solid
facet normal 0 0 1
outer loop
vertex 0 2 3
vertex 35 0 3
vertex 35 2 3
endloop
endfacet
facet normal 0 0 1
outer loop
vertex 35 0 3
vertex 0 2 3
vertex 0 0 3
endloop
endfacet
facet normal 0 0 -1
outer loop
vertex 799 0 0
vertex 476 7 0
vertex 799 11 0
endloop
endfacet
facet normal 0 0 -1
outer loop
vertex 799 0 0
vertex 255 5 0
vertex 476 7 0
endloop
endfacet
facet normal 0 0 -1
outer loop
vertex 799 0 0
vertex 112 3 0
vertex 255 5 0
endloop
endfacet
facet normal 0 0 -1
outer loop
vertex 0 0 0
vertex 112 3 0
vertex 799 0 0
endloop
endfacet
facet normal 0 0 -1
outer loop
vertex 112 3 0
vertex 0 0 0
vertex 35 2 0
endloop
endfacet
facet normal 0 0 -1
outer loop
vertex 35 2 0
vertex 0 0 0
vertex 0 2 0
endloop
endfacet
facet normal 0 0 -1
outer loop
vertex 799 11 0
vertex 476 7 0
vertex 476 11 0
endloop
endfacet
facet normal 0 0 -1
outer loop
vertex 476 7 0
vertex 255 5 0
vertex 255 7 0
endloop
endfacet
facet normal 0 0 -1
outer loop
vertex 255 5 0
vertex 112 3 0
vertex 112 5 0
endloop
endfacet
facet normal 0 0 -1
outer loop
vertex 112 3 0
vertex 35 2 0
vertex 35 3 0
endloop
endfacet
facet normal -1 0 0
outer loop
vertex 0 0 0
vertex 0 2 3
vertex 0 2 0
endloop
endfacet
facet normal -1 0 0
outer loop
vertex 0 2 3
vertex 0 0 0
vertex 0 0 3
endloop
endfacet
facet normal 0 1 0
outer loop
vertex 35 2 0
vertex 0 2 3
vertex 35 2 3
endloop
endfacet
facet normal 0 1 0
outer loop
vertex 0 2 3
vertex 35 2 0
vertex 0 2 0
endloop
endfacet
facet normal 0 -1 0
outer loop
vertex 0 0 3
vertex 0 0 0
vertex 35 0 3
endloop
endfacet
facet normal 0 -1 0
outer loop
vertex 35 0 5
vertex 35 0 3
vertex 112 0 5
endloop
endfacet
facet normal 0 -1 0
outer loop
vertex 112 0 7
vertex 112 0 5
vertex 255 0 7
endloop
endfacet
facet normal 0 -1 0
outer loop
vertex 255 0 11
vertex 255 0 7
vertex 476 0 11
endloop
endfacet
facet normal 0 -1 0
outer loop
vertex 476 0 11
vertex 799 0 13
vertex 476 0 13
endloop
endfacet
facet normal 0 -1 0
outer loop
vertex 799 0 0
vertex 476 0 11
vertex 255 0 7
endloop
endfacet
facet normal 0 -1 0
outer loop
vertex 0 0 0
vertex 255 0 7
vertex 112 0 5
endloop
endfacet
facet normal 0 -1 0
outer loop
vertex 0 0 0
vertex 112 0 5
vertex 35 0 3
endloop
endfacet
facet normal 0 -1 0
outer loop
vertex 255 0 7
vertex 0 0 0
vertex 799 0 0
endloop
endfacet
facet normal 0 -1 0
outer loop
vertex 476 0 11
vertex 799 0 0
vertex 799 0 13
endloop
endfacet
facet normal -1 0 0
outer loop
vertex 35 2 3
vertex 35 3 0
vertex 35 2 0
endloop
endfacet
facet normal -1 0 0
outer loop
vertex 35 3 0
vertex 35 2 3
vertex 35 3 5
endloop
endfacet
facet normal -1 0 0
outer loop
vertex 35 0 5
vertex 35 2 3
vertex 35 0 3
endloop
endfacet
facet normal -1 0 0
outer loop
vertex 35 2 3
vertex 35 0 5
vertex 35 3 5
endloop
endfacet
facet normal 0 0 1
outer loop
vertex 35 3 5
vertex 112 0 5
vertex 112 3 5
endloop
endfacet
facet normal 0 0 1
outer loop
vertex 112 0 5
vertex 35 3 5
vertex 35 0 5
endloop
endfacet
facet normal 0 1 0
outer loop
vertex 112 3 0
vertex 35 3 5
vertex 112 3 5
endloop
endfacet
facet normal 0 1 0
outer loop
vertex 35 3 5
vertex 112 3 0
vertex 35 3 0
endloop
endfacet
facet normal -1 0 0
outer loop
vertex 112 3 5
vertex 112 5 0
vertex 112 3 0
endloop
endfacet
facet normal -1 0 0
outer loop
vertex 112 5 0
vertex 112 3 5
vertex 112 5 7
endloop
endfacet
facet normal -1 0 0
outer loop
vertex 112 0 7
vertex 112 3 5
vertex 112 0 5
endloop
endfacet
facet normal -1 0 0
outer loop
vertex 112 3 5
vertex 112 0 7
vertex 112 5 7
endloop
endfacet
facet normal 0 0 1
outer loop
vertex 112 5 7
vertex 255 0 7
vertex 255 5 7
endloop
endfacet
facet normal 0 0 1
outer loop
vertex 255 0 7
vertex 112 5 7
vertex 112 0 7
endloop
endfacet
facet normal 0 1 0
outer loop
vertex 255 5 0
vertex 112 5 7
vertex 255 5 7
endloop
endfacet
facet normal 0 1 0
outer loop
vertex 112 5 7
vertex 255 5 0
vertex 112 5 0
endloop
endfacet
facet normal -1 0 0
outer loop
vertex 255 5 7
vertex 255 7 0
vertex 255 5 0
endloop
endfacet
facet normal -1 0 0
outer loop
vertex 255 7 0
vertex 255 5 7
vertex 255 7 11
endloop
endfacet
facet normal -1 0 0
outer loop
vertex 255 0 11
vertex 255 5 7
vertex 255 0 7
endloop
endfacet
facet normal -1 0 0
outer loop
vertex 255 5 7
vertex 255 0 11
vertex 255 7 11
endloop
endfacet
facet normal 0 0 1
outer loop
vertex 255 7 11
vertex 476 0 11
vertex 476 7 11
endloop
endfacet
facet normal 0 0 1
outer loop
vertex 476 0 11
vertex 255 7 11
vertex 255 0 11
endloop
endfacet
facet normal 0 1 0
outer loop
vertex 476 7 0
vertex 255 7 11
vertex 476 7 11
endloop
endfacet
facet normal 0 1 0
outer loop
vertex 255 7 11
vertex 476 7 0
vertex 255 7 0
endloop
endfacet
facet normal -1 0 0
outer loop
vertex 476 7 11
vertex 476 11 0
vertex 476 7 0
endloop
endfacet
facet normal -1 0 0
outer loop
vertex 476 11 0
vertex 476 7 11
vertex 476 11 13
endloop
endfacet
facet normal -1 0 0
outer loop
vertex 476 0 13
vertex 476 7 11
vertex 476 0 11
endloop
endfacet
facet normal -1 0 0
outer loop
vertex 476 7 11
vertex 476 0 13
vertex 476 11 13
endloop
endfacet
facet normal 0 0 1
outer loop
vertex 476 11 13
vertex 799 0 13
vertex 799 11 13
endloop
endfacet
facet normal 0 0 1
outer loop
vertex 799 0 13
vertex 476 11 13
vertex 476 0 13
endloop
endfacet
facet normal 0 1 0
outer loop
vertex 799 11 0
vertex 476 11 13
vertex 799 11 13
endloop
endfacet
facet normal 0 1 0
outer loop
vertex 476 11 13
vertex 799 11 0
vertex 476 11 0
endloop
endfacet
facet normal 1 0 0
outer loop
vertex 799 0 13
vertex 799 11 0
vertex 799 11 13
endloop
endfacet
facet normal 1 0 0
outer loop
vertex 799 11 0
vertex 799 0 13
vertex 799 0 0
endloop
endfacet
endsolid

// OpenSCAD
translate([2.5, 1.0, 1.5]) color([0.10530639745894443, 0.9556548717215211, 0.5435731515542631]) cube([5, 2, 3], center=true);
translate([7.5, 1.0, 1.5]) color([0.7414270622920264, 0.9040457292510377, 0.2786145977098805]) cube([5, 2, 3], center=true);
translate([12.5, 1.0, 1.5]) color([0.4423646135017597, 0.5682329433322765, 0.13781274972163116]) cube([5, 2, 3], center=true);
translate([17.5, 1.0, 1.5]) color([0.1232982180791492, 0.12051785276403837, 0.4012165411640888]) cube([5, 2, 3], center=true);
translate([22.5, 1.0, 1.5]) color([0.4679428423906348, 0.5596131508667647, 0.29896126951320356]) cube([5, 2, 3], center=true);
translate([27.5, 1.0, 1.5]) color([0.6321114709426877, 0.7423454703026071, 0.21800995973285464]) cube([5, 2, 3], center=true);
translate([32.5, 1.0, 1.5]) color([0.48885816108208613, 0.501567157493831, 0.49271975198428686]) cube([5, 2, 3], center=true);
translate([38.5, 1.5, 2.5]) color([0.958422556968198, 0.44398175403613704, 0.14281143058247625]) cube([7, 3, 5], center=true);
translate([45.5, 1.5, 2.5]) color([0.4955231327742775, 0.8873352305676206, 0.21571394075115613]) cube([7, 3, 5], center=true);
translate([52.5, 1.5, 2.5]) color([0.3554013630116646, 0.39096604949642, 0.9928835035123682]) cube([7, 3, 5], center=true);
translate([59.5, 1.5, 2.5]) color([0.8462248334797323, 0.9789066021625461, 0.6868956228130294]) cube([7, 3, 5], center=true);
translate([66.5, 1.5, 2.5]) color([0.08137290691060206, 0.9493092651810784, 0.9246190463677613]) cube([7, 3, 5], center=true);
translate([73.5, 1.5, 2.5]) color([0.3951154575230438, 0.3612783181755085, 0.11615210489091876]) cube([7, 3, 5], center=true);
translate([80.5, 1.5, 2.5]) color([0.0037403702712440756, 0.2703277384724262, 0.6403732426441148]) cube([7, 3, 5], center=true);
translate([87.5, 1.5, 2.5]) color([0.29252642189785794, 0.9007258804640697, 0.14067978971908934]) cube([7, 3, 5], center=true);
translate([94.5, 1.5, 2.5]) color([0.5728503338092871, 0.1912043400515635, 0.43401891336511733]) cube([7, 3, 5], center=true);
translate([101.5, 1.5, 2.5]) color([0.7163457448050065, 0.3841301513333275, 0.33069552050314754]) cube([7, 3, 5], center=true);
translate([108.5, 1.5, 2.5]) color([0.6480049557775331, 0.6874717059379091, 0.14801928734251768]) cube([7, 3, 5], center=true);
translate([117.5, 2.5, 3.5]) color([0.93323205939552, 0.14750072005511716, 0.31607169754224296]) cube([11, 5, 7], center=true);
translate([128.5, 2.5, 3.5]) color([0.2088660889148145, 0.1868244368145192, 0.3491672112743387]) cube([11, 5, 7], center=true);
translate([139.5, 2.5, 3.5]) color([0.9834841816788549, 0.427290207198605, 0.49195852420878716]) cube([11, 5, 7], center=true);
translate([150.5, 2.5, 3.5]) color([0.7297831417632067, 0.7955834433152874, 0.43927203819181504]) cube([11, 5, 7], center=true);
translate([161.5, 2.5, 3.5]) color([0.2042687131951023, 0.709997013582239, 0.9058221085991531]) cube([11, 5, 7], center=true);
translate([172.5, 2.5, 3.5]) color([0.03327924187503195, 0.6331757983912308, 0.8710093735661795]) cube([11, 5, 7], center=true);
translate([183.5, 2.5, 3.5]) color([0.3636101637556439, 0.7431628081058981, 0.6774926049513658]) cube([11, 5, 7], center=true);
translate([194.5, 2.5, 3.5]) color([0.23306417175218364, 0.2975271762349214, 0.0866296567389645]) cube([11, 5, 7], center=true);
translate([205.5, 2.5, 3.5]) color([0.8688435220131177, 0.7514921149941085, 0.7714305883456576]) cube([11, 5, 7], center=true);
translate([216.5, 2.5, 3.5]) color([0.8829516943772963, 0.4114323292545551, 0.05394001775890156]) cube([11, 5, 7], center=true);
translate([227.5, 2.5, 3.5]) color([0.696805048854085, 0.6656296547984208, 0.6485122289860075]) cube([11, 5, 7], center=true);
translate([238.5, 2.5, 3.5]) color([0.5471816206705559, 0.7344166333532061, 0.4306045068871984]) cube([11, 5, 7], center=true);
translate([249.5, 2.5, 3.5]) color([0.45460236437769275, 0.25475221651879554, 0.47565246533915095]) cube([11, 5, 7], center=true);
translate([261.5, 3.5, 5.5]) color([0.3371942584654095, 0.04223511400675217, 0.05255331220371673]) cube([13, 7, 11], center=true);
translate([274.5, 3.5, 5.5]) color([0.34980223330761895, 0.2898096938030986, 0.007130057665757694]) cube([13, 7, 11], center=true);
translate([287.5, 3.5, 5.5]) color([0.06369015415518986, 0.42774457246440645, 0.22216650821772055]) cube([13, 7, 11], center=true);
translate([300.5, 3.5, 5.5]) color([0.6086379170158094, 0.557768500755667, 0.22097295115667703]) cube([13, 7, 11], center=true);
translate([313.5, 3.5, 5.5]) color([0.19284823789822858, 0.6083188139076446, 0.606354511401297]) cube([13, 7, 11], center=true);
translate([326.5, 3.5, 5.5]) color([0.08562053587131313, 0.31903016062772993, 0.53590115499306]) cube([13, 7, 11], center=true);
translate([339.5, 3.5, 5.5]) color([0.8934753784920533, 0.25549985489866966, 0.5219903070058861]) cube([13, 7, 11], center=true);
translate([352.5, 3.5, 5.5]) color([0.1901317713313112, 0.08011594570868696, 0.8699478397109702]) cube([13, 7, 11], center=true);
translate([365.5, 3.5, 5.5]) color([0.3457472114844995, 0.837290862214726, 0.25127706432840136]) cube([13, 7, 11], center=true);
translate([378.5, 3.5, 5.5]) color([0.7290260027021367, 0.3013213449137814, 0.5169005458056509]) cube([13, 7, 11], center=true);
translate([391.5, 3.5, 5.5]) color([0.38467176448284957, 0.4820846642847386, 0.8719757028853922]) cube([13, 7, 11], center=true);
translate([404.5, 3.5, 5.5]) color([0.2399620044566907, 0.3058147052987177, 0.5519737755681405]) cube([13, 7, 11], center=true);
translate([417.5, 3.5, 5.5]) color([0.009208459116004764, 0.4953005367860557, 0.43819859659275806]) cube([13, 7, 11], center=true);
translate([430.5, 3.5, 5.5]) color([0.9171481192782721, 0.41212019308576986, 0.49358197644734136]) cube([13, 7, 11], center=true);
translate([443.5, 3.5, 5.5]) color([0.44010860560926524, 0.0856157398333921, 0.2411443971002879]) cube([13, 7, 11], center=true);
translate([456.5, 3.5, 5.5]) color([0.8262650576639278, 0.15379567752788093, 0.8842528530898255]) cube([13, 7, 11], center=true);
translate([469.5, 3.5, 5.5]) color([0.2134665283608419, 0.6127566924478359, 0.818008657000479]) cube([13, 7, 11], center=true);
translate([484.5, 5.5, 6.5]) color([0.5590112191053322, 0.8866043301622452, 0.39447102725022787]) cube([17, 11, 13], center=true);
translate([501.5, 5.5, 6.5]) color([0.9589163376419946, 0.24972819156954773, 0.22005049979750413]) cube([17, 11, 13], center=true);
translate([518.5, 5.5, 6.5]) color([0.8404590105346786, 0.2789960200671917, 0.35210354864297055]) cube([17, 11, 13], center=true);
translate([535.5, 5.5, 6.5]) color([0.9946691500756418, 0.10728537706325991, 0.8996256313138141]) cube([17, 11, 13], center=true);
translate([552.5, 5.5, 6.5]) color([0.6100819970747507, 0.7890377134172993, 0.7110679469752405]) cube([17, 11, 13], center=true);
translate([569.5, 5.5, 6.5]) color([0.7774643558396669, 0.5140354678382717, 0.46207744282607]) cube([17, 11, 13], center=true);
translate([586.5, 5.5, 6.5]) color([0.6343562920465169, 0.27254621857246664, 0.016558424522952975]) cube([17, 11, 13], center=true);
translate([603.5, 5.5, 6.5]) color([0.6148716567717017, 0.7119066573597548, 0.17257617960039529]) cube([17, 11, 13], center=true);
translate([620.5, 5.5, 6.5]) color([0.41465974039415787, 0.21806470516739018, 0.8797884787327306]) cube([17, 11, 13], center=true);
translate([637.5, 5.5, 6.5]) color([0.9971497033508181, 0.006439244314443648, 0.5355241113549698]) cube([17, 11, 13], center=true);
translate([654.5, 5.5, 6.5]) color([0.428269623660265, 0.0497703561320445, 0.3846945959716809]) cube([17, 11, 13], center=true);
translate([671.5, 5.5, 6.5]) color([0.27248481749180187, 0.9711494351721061, 0.5646669518865992]) cube([17, 11, 13], center=true);
translate([688.5, 5.5, 6.5]) color([0.22956269737245216, 0.7165492601952248, 0.5466375027642284]) cube([17, 11, 13], center=true);
translate([705.5, 5.5, 6.5]) color([0.2821670936164109, 0.7398695784196249, 0.9015687423954613]) cube([17, 11, 13], center=true);
translate([722.5, 5.5, 6.5]) color([0.06478718309218656, 0.3075184499818515, 0.32730937178137276]) cube([17, 11, 13], center=true);
translate([739.5, 5.5, 6.5]) color([0.373196919474838, 0.48026967262350795, 0.5820603979481933]) cube([17, 11, 13], center=true);
translate([756.5, 5.5, 6.5]) color([0.1372879505883815, 0.015498761483451418, 0.5048497045627587]) cube([17, 11, 13], center=true);
translate([773.5, 5.5, 6.5]) color([0.36698725510709684, 0.6348155217266559, 0.811995686067811]) cube([17, 11, 13], center=true);
translate([790.5, 5.5, 6.5]) color([0.8768405645756486, 0.1552431358080847, 0.1767648869043179]) cube([17, 11, 13], center=true);
